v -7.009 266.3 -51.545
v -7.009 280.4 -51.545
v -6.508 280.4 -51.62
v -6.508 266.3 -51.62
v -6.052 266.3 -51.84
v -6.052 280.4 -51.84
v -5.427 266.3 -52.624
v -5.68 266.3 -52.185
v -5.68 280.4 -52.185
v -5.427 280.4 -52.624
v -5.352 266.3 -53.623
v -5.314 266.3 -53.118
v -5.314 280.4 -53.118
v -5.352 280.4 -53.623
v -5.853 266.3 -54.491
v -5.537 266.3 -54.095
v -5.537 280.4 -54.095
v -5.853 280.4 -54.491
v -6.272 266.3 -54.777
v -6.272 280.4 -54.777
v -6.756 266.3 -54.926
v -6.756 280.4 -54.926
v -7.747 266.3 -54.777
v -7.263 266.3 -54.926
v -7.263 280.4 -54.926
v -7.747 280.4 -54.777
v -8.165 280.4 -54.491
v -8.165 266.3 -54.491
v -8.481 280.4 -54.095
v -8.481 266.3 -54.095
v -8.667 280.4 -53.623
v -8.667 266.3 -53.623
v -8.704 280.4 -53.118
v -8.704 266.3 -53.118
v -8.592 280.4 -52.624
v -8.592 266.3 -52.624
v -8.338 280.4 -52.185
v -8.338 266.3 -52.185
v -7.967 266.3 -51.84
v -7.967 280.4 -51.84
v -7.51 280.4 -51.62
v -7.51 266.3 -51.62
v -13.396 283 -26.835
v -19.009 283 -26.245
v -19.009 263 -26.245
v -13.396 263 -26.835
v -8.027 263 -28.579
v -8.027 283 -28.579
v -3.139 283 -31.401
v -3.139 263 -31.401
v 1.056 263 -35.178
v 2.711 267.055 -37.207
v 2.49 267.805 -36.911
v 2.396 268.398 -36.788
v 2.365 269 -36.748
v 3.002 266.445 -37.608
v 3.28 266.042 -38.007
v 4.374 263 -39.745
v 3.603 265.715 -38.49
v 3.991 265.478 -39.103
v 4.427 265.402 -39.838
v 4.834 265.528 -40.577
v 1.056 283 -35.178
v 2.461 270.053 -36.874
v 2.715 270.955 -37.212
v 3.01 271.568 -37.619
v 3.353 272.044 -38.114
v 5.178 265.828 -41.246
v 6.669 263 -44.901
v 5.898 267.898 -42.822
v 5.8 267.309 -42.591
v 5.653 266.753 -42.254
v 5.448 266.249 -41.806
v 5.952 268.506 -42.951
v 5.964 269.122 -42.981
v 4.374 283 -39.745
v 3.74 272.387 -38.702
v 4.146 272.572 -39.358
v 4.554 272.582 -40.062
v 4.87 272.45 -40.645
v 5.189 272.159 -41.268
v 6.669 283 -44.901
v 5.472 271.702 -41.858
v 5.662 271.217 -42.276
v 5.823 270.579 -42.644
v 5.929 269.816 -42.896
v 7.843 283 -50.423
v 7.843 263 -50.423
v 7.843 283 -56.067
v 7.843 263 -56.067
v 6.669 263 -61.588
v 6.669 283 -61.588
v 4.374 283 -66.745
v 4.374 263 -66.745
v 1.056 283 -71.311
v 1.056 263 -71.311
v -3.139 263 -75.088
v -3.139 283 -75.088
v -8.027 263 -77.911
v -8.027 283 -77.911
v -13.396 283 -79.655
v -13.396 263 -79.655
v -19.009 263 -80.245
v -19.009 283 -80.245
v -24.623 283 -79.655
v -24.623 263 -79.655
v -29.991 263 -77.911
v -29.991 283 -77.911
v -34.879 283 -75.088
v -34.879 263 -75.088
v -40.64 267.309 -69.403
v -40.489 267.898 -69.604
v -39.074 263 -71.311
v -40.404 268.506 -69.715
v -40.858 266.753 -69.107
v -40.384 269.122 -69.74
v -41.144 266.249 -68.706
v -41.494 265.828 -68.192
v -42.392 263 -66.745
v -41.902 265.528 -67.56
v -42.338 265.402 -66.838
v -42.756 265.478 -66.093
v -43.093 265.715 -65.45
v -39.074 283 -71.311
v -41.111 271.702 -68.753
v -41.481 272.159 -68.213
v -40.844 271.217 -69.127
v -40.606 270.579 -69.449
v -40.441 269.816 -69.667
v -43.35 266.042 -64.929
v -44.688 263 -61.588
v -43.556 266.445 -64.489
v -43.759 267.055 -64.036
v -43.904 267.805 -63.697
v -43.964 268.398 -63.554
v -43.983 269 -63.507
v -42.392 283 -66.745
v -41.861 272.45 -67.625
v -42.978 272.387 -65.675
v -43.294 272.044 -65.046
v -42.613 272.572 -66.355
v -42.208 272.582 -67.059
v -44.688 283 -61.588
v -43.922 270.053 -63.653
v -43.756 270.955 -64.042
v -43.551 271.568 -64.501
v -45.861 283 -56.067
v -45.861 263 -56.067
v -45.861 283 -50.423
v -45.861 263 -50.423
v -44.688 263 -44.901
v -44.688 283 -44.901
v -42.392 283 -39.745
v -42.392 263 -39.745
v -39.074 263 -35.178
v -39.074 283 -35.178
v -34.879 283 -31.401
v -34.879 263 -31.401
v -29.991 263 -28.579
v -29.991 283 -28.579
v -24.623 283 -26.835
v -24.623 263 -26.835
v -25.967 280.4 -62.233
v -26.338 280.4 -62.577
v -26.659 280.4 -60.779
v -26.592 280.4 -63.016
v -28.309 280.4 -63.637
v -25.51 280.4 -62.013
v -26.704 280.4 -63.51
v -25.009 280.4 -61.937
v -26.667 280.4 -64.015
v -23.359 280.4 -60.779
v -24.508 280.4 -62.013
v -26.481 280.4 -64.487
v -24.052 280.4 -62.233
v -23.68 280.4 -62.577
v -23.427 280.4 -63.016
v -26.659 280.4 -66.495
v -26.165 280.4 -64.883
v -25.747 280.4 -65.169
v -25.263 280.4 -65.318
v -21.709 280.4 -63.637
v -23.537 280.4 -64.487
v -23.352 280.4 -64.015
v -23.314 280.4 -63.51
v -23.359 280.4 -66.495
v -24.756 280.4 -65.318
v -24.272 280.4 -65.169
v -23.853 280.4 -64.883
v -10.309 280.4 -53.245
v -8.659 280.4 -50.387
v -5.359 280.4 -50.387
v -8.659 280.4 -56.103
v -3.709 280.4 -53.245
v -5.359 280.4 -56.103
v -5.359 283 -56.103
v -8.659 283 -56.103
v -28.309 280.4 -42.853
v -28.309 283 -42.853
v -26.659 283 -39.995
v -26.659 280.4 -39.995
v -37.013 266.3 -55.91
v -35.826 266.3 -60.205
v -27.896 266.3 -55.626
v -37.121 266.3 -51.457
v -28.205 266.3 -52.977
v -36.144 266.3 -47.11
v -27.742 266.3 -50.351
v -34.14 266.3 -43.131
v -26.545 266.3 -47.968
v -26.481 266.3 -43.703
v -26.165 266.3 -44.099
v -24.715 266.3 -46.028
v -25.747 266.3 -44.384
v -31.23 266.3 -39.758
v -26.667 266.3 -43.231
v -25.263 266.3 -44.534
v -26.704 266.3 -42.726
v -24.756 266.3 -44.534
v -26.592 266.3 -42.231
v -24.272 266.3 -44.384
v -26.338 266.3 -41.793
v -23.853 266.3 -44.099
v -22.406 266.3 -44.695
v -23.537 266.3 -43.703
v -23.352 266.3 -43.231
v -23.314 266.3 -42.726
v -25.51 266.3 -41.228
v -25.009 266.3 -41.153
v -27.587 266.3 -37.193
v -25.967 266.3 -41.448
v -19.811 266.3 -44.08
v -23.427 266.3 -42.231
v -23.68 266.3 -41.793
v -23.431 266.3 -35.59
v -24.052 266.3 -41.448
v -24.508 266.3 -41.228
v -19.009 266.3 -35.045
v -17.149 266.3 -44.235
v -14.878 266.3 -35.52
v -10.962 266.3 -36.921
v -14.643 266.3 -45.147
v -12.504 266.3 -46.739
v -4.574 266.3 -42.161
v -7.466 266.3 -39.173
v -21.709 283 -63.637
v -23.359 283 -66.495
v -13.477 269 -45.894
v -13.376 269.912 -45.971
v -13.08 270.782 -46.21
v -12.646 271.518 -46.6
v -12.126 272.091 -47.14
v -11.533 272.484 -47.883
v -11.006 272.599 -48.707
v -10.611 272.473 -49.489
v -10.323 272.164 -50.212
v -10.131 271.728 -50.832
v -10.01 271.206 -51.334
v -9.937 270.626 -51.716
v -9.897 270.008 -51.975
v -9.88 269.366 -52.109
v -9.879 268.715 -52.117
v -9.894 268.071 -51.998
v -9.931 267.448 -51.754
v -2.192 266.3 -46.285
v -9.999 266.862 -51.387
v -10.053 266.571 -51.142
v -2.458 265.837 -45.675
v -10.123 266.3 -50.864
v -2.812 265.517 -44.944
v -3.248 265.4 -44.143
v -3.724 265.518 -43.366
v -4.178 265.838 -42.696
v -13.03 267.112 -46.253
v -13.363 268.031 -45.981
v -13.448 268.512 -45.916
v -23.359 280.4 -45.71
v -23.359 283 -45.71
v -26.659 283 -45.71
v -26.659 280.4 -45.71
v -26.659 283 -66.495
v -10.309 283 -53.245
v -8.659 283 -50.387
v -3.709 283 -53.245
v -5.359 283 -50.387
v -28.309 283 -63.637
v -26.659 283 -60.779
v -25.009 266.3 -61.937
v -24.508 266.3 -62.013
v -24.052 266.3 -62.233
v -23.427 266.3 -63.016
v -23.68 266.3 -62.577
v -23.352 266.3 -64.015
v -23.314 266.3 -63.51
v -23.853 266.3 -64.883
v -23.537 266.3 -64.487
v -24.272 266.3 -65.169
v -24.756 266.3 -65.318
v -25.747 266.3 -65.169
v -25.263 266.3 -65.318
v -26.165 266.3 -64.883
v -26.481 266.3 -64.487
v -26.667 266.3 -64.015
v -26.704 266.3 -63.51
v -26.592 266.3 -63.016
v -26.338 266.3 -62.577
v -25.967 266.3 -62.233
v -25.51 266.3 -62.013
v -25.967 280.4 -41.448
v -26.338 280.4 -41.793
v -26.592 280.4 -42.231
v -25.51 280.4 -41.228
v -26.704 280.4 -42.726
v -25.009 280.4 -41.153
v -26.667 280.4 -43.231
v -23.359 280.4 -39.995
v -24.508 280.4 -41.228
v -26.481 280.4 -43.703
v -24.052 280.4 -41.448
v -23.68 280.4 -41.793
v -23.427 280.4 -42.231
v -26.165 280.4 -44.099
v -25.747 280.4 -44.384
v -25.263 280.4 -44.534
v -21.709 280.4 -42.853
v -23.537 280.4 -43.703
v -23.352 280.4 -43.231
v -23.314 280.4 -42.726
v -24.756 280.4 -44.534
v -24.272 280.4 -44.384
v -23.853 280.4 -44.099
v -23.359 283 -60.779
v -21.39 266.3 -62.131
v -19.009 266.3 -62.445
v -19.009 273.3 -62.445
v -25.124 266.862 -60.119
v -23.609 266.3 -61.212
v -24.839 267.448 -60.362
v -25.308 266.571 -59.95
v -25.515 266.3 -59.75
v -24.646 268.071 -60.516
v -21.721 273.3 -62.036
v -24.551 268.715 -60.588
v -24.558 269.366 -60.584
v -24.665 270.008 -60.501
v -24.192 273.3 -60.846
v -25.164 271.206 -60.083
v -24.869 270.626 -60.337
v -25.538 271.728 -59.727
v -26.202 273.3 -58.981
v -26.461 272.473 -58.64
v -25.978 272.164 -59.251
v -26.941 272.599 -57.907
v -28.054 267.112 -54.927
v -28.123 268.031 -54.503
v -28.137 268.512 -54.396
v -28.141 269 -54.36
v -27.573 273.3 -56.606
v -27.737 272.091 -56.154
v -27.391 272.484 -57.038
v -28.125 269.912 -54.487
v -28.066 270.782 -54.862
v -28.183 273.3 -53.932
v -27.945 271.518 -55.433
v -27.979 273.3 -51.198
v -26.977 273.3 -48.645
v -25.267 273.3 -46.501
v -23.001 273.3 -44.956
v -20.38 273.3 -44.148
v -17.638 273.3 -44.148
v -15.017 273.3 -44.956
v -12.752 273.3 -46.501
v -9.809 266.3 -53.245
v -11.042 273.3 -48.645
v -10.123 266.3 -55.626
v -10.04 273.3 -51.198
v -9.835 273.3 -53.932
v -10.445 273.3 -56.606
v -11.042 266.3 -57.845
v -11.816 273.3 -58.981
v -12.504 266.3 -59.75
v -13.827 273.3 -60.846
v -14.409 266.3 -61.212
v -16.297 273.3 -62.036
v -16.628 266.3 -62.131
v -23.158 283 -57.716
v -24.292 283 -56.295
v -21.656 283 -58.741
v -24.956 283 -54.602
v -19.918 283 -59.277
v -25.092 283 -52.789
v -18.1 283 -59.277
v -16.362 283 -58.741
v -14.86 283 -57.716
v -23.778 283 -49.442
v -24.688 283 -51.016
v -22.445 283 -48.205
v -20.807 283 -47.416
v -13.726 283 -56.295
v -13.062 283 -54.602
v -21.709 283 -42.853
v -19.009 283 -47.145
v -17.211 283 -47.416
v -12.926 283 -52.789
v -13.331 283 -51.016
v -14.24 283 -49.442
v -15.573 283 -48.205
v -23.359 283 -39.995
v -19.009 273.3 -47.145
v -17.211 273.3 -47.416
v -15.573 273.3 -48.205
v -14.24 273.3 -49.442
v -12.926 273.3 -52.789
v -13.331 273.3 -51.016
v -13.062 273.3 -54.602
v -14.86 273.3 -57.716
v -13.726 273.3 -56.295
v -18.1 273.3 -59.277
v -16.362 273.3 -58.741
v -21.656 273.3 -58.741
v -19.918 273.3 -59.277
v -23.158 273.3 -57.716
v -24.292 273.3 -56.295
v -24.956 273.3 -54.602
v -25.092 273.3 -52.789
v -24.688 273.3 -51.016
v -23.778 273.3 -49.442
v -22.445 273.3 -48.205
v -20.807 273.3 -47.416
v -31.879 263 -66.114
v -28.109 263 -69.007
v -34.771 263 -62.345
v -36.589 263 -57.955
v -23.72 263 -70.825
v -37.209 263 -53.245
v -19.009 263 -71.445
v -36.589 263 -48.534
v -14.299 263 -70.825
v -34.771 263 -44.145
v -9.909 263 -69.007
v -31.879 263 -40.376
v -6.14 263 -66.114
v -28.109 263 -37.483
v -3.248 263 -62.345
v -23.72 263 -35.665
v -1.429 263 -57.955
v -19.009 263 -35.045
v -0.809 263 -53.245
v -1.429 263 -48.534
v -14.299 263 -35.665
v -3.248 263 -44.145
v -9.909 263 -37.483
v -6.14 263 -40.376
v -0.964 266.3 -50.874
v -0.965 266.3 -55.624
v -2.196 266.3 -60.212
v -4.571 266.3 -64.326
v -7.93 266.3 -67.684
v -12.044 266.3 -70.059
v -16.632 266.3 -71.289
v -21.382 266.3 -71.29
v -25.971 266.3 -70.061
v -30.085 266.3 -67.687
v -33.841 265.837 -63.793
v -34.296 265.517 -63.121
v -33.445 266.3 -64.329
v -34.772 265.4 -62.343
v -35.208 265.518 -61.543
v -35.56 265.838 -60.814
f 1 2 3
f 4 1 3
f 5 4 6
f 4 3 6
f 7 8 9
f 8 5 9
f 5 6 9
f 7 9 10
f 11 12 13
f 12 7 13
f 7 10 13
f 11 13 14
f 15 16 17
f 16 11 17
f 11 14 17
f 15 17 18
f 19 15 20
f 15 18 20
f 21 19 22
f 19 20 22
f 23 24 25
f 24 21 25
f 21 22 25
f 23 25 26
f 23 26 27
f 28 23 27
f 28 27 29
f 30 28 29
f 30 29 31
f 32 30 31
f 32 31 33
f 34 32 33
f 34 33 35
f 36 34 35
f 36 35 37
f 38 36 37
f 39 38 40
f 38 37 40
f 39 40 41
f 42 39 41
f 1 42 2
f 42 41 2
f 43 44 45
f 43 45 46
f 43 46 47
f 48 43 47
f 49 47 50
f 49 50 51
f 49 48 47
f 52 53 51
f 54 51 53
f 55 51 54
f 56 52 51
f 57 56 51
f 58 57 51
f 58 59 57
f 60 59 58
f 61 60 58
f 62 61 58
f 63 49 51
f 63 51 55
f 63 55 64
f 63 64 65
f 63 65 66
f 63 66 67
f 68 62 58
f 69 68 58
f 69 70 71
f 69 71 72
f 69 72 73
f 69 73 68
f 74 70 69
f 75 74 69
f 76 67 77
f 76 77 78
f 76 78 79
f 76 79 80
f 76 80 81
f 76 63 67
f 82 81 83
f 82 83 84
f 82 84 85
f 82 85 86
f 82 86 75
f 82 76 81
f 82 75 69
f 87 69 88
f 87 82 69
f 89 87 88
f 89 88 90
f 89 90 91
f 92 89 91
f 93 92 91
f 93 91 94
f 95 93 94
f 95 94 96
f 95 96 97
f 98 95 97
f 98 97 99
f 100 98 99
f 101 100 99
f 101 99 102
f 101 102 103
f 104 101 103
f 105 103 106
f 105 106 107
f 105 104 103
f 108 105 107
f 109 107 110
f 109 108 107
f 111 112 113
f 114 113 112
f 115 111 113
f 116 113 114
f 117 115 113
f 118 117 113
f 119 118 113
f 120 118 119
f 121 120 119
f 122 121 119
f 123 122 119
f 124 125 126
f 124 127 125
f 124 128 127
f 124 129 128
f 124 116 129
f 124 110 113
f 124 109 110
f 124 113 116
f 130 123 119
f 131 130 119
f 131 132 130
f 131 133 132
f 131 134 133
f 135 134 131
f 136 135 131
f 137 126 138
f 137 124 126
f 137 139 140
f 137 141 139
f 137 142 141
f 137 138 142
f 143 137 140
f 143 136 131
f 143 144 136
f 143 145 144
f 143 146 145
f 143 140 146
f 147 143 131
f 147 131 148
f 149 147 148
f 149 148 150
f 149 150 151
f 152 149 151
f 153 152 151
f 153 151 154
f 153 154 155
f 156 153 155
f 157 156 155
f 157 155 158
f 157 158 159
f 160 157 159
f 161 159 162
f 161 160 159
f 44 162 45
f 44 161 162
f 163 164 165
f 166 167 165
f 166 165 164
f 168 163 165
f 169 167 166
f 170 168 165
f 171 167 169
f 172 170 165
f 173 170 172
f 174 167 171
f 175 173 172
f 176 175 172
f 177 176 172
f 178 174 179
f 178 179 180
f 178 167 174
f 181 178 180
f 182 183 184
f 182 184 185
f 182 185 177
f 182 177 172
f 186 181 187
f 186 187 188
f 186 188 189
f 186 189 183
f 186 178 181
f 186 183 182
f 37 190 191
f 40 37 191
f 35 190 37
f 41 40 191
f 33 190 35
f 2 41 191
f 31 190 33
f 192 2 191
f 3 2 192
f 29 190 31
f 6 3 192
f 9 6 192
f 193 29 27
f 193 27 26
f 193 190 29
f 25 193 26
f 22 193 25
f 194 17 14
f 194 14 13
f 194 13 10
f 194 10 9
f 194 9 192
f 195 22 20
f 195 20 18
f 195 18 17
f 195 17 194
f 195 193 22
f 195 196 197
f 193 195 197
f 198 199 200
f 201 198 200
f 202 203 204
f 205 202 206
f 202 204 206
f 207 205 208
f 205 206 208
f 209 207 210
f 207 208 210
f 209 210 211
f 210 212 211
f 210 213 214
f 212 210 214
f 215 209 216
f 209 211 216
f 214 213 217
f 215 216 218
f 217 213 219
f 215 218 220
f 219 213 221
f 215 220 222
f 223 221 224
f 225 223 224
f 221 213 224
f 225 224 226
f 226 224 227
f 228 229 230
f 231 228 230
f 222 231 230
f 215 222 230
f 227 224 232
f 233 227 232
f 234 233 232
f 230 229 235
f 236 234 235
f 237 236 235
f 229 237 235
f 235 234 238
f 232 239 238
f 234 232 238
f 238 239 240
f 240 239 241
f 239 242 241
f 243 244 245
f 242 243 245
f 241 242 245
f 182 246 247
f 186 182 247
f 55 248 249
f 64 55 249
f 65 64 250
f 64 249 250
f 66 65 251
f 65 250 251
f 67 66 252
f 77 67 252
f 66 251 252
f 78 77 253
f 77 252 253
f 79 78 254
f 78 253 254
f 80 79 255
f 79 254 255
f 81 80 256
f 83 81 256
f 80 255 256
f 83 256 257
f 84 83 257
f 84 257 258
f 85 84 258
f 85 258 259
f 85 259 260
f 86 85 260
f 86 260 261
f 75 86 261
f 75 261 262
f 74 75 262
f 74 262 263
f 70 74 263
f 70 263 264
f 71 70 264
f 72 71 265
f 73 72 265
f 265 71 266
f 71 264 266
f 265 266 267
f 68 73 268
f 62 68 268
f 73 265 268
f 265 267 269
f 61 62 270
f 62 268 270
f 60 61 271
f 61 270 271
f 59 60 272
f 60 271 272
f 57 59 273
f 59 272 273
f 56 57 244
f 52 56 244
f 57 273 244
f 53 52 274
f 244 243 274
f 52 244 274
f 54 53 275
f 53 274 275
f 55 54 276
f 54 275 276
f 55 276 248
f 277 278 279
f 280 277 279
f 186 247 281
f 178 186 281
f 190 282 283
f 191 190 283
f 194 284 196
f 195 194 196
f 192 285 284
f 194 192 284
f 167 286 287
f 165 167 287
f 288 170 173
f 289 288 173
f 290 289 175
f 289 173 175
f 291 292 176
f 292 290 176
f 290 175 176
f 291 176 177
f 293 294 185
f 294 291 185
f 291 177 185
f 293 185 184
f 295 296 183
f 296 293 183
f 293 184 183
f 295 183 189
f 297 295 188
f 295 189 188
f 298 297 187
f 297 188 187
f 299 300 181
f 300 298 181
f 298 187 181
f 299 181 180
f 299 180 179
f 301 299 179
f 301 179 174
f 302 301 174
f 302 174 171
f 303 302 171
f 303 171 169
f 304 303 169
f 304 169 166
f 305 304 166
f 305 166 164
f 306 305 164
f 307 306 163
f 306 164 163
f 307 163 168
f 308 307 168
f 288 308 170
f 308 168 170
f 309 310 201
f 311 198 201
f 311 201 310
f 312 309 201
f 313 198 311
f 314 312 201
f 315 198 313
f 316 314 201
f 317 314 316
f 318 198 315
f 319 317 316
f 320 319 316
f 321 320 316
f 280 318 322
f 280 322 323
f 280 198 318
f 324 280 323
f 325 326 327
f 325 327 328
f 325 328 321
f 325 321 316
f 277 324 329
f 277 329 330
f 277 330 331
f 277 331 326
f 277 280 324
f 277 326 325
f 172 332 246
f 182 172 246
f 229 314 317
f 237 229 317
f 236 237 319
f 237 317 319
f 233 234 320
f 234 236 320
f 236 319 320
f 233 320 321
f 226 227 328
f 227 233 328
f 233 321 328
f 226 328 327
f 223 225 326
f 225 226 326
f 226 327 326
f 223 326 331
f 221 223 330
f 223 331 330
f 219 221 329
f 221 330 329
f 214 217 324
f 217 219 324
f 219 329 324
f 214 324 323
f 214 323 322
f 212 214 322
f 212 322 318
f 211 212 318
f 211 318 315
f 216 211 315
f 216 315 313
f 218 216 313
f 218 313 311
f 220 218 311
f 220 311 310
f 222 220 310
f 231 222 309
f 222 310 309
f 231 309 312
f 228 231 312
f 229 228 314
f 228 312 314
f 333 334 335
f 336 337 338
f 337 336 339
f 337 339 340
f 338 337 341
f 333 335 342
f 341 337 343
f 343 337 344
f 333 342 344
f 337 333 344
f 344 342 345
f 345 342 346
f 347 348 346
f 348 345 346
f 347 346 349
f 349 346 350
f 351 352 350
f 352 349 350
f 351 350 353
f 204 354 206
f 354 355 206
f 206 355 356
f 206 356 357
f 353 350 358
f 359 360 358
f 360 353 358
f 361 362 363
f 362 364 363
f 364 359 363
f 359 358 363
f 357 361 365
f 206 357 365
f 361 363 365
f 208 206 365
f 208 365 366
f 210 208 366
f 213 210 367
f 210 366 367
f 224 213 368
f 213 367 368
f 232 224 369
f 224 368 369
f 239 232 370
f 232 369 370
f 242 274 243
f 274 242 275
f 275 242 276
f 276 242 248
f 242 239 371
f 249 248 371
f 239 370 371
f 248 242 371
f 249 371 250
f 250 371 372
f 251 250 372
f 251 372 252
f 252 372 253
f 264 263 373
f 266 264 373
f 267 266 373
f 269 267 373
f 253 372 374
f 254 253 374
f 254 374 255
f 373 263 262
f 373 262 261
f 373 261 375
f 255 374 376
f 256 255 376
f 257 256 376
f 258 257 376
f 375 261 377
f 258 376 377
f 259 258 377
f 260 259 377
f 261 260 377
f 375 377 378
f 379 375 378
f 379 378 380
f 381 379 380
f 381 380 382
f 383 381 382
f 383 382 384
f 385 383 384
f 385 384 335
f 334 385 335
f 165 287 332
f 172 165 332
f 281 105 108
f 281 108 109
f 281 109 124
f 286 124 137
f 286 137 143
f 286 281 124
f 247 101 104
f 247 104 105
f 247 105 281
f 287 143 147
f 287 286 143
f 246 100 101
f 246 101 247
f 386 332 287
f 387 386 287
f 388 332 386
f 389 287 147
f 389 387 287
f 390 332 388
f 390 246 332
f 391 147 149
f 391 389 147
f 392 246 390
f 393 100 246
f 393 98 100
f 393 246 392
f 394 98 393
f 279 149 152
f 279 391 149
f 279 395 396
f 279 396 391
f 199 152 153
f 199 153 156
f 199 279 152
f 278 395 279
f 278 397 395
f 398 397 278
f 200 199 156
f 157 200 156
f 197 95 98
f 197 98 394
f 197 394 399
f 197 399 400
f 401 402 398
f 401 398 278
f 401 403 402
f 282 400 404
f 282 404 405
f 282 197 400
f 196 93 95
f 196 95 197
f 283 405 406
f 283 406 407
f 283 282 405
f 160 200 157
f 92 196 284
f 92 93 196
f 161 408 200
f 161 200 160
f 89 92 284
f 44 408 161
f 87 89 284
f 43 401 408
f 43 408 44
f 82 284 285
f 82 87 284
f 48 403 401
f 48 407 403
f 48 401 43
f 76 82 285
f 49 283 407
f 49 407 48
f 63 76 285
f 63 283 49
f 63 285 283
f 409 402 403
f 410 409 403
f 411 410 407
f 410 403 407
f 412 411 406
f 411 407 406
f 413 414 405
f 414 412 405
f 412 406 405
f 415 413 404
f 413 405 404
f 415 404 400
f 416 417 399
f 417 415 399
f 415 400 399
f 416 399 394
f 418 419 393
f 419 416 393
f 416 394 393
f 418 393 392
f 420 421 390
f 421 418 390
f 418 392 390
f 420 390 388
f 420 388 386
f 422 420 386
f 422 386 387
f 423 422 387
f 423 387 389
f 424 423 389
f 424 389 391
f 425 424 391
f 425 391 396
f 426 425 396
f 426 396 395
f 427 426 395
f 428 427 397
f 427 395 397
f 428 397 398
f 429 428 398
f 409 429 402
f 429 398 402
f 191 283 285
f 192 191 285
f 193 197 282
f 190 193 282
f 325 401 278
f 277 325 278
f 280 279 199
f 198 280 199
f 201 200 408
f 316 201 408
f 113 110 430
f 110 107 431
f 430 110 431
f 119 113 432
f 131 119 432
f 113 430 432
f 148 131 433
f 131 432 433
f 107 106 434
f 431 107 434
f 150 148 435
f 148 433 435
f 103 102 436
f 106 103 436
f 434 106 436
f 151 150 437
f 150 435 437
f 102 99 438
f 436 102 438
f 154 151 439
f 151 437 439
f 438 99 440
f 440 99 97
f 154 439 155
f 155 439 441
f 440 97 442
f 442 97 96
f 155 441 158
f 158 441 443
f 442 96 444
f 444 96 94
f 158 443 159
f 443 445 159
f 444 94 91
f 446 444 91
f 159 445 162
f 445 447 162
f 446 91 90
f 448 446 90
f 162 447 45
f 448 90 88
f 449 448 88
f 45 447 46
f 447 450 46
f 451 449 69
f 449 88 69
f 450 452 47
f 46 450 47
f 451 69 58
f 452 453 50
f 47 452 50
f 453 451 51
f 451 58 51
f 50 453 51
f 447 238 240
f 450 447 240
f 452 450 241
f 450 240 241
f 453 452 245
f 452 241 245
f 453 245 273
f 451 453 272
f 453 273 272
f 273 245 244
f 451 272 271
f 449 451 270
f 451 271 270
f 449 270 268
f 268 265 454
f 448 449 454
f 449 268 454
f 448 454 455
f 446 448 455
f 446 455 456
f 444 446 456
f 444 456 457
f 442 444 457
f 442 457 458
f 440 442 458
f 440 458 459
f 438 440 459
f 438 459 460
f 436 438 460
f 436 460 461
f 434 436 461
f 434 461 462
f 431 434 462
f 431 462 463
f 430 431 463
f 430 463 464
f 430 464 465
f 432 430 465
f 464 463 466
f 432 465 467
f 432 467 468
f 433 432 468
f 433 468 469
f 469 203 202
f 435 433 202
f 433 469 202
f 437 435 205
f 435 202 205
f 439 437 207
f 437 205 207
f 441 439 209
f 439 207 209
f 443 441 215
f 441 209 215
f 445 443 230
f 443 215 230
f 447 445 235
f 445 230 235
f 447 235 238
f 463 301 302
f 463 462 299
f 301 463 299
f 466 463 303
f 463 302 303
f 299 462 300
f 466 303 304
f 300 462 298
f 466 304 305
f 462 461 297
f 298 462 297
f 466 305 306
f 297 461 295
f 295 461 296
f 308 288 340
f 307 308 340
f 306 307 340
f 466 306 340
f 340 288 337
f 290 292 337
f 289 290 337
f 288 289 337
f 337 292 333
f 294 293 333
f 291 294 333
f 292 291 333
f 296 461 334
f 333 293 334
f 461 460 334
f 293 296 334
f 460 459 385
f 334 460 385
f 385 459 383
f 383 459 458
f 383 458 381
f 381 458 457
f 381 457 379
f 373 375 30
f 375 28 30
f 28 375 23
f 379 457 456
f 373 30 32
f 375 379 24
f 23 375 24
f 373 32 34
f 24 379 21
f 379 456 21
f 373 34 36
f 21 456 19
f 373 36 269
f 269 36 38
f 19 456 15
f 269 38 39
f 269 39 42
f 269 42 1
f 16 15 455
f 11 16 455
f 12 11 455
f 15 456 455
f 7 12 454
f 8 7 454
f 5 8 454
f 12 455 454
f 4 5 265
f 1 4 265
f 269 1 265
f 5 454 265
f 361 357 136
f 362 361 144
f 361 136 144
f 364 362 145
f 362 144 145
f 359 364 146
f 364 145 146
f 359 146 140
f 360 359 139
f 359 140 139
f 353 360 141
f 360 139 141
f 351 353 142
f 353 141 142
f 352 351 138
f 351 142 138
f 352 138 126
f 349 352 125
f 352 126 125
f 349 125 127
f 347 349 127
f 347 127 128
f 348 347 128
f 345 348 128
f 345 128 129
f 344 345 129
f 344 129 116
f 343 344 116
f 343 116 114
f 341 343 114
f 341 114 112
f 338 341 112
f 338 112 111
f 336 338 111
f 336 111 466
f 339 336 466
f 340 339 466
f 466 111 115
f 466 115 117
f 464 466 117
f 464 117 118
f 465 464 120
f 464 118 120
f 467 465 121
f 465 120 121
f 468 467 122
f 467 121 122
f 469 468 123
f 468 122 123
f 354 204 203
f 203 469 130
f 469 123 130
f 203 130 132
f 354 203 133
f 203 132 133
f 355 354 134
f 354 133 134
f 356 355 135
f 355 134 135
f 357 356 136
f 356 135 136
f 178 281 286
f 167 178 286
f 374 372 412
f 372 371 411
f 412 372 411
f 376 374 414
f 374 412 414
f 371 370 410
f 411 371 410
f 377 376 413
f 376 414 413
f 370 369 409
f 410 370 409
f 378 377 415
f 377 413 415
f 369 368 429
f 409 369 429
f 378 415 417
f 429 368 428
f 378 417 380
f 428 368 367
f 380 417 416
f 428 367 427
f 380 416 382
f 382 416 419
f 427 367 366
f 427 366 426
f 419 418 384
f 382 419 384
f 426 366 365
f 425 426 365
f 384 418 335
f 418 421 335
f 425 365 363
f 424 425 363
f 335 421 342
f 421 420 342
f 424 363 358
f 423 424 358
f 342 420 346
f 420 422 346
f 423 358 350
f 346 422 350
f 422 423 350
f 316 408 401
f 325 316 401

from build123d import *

# Parameters (mm, degrees)
TYRE_SEAT_BLANK_SKETCH_R        = 27
TYRE_SEAT_BLANK_DEPTH           = 20
AXLE_CLEARANCE_SKETCH_R         = 6.1
AXLE_CLEARANCE_DEPTH            = 20.2
HUB_NECK_SOCKET_SKETCH_R        = 9.2
HUB_NECK_SOCKET_DEPTH           = 10.5
HUB_FLANGE_SOCKET_SKETCH_R      = 18.2
HUB_FLANGE_SOCKET_DEPTH         = 3.5
RIM_BOLT_PATTERN_SKETCH_R       = 1.7
RIM_BOLT_PATTERN_DEPTH          = 20.2
RIM_NUT_POCKETS_DEPTH           = 2.7
HUB_PIN_SERVICE_WINDOW_SKETCH_R = 3.6
HUB_PIN_SERVICE_WINDOW_DEPTH    = 56


with BuildPart() as part:
    # Tyre seat blank sketch → Tyre seat blank (new body)
    with BuildSketch(Plane(origin=(0, -283, 0), x_dir=(1, 0, 0), z_dir=(0, 1, 0))):
        with Locations(Location((-19.009182883, 53.244882879, 0), (0, 0, 270))):
            Circle(TYRE_SEAT_BLANK_SKETCH_R)
    extrude(amount=TYRE_SEAT_BLANK_DEPTH)

    # Axle clearance sketch → Axle clearance (cut)
    with BuildSketch(Plane(origin=(0, -283.1, 0), x_dir=(1, 0, 0), z_dir=(0, 1, 0))):
        with Locations(Location((-19.009182883, 53.244882879, 0), (0, 0, 270))):
            Circle(AXLE_CLEARANCE_SKETCH_R)
    extrude(amount=AXLE_CLEARANCE_DEPTH, mode=Mode.SUBTRACT)

    # Hub neck socket sketch → Hub neck socket (cut)
    with BuildSketch(Plane(origin=(0, -273.3, 0), x_dir=(1, 0, 0), z_dir=(0, 1, 0))):
        with Locations(Location((-19.009182883, 53.244882879, 0), (0, 0, 90))):
            Circle(HUB_NECK_SOCKET_SKETCH_R)
    extrude(amount=HUB_NECK_SOCKET_DEPTH, mode=Mode.SUBTRACT)

    # Hub flange socket sketch → Hub flange socket (cut)
    with BuildSketch(Plane(origin=(0, -266.3, 0), x_dir=(1, 0, 0), z_dir=(0, 1, 0))):
        with Locations(Location((-19.009182883, 53.244882879, 0), (0, 0, 270))):
            Circle(HUB_FLANGE_SOCKET_SKETCH_R)
    extrude(amount=HUB_FLANGE_SOCKET_DEPTH, mode=Mode.SUBTRACT)

    # Rim bolt pattern sketch → Rim bolt pattern (cut)
    with BuildSketch(Plane(origin=(0, -283.1, 0), x_dir=(1, 0, 0), z_dir=(0, 1, 0))):
        with Locations(Location((-7.009182883, 53.244882879, 0), (0, 0, 270))):
            Circle(RIM_BOLT_PATTERN_SKETCH_R)
        with Locations(Location((-25.009182883, 42.852578033, 0), (0, 0, 270))):
            Circle(RIM_BOLT_PATTERN_SKETCH_R)
        with Locations(Location((-25.009182883, 63.637187724, 0), (0, 0, 270))):
            Circle(RIM_BOLT_PATTERN_SKETCH_R)
    extrude(amount=RIM_BOLT_PATTERN_DEPTH, mode=Mode.SUBTRACT)

    # Rim nut pockets sketch → Rim nut pockets (cut)
    with BuildSketch(Plane(origin=(0, -283.1, 0), x_dir=(1, 0, 0), z_dir=(0, 1, 0))):
        Polygon((-3.709182883, 53.244882879), (-5.359182883, 56.102766711), (-8.659182883, 56.102766711), (-10.309182883, 53.244882879), (-8.659182883, 50.386999046), (-5.359182883, 50.386999046), align=None)
        Polygon((-21.709182883, 42.852578033), (-23.359182883, 45.710461866), (-26.659182883, 45.710461866), (-28.309182883, 42.852578033), (-26.659182883, 39.994694201), (-23.359182883, 39.994694201), align=None)
        Polygon((-21.709182883, 63.637187724), (-23.359182883, 66.495071557), (-26.659182883, 66.495071557), (-28.309182883, 63.637187724), (-26.659182883, 60.779303892), (-23.359182883, 60.779303892), align=None)
    extrude(amount=RIM_NUT_POCKETS_DEPTH, mode=Mode.SUBTRACT)

    # Hub pin service window sketch → Hub pin service window (cut)
    with BuildSketch(Plane(origin=(-61.561309066, 0, -35.542438361), x_dir=(0.4999999999999994, 0, -0.866025403784439), z_dir=(0.866025403784439, 0, 0.4999999999999994))):
        with Locations(Location((36.606829753, -269, 0), (0, 0, 180))):
            Circle(HUB_PIN_SERVICE_WINDOW_SKETCH_R)
    extrude(amount=HUB_PIN_SERVICE_WINDOW_DEPTH, mode=Mode.SUBTRACT)


with BuildPart() as body_2:
    # Mirror1: mirrored copy
    add(part.part.mirror(Plane(origin=(0, 0, 0), x_dir=(0, 0, 1), z_dir=(0, -1, 0))))


solid = body_2.part
